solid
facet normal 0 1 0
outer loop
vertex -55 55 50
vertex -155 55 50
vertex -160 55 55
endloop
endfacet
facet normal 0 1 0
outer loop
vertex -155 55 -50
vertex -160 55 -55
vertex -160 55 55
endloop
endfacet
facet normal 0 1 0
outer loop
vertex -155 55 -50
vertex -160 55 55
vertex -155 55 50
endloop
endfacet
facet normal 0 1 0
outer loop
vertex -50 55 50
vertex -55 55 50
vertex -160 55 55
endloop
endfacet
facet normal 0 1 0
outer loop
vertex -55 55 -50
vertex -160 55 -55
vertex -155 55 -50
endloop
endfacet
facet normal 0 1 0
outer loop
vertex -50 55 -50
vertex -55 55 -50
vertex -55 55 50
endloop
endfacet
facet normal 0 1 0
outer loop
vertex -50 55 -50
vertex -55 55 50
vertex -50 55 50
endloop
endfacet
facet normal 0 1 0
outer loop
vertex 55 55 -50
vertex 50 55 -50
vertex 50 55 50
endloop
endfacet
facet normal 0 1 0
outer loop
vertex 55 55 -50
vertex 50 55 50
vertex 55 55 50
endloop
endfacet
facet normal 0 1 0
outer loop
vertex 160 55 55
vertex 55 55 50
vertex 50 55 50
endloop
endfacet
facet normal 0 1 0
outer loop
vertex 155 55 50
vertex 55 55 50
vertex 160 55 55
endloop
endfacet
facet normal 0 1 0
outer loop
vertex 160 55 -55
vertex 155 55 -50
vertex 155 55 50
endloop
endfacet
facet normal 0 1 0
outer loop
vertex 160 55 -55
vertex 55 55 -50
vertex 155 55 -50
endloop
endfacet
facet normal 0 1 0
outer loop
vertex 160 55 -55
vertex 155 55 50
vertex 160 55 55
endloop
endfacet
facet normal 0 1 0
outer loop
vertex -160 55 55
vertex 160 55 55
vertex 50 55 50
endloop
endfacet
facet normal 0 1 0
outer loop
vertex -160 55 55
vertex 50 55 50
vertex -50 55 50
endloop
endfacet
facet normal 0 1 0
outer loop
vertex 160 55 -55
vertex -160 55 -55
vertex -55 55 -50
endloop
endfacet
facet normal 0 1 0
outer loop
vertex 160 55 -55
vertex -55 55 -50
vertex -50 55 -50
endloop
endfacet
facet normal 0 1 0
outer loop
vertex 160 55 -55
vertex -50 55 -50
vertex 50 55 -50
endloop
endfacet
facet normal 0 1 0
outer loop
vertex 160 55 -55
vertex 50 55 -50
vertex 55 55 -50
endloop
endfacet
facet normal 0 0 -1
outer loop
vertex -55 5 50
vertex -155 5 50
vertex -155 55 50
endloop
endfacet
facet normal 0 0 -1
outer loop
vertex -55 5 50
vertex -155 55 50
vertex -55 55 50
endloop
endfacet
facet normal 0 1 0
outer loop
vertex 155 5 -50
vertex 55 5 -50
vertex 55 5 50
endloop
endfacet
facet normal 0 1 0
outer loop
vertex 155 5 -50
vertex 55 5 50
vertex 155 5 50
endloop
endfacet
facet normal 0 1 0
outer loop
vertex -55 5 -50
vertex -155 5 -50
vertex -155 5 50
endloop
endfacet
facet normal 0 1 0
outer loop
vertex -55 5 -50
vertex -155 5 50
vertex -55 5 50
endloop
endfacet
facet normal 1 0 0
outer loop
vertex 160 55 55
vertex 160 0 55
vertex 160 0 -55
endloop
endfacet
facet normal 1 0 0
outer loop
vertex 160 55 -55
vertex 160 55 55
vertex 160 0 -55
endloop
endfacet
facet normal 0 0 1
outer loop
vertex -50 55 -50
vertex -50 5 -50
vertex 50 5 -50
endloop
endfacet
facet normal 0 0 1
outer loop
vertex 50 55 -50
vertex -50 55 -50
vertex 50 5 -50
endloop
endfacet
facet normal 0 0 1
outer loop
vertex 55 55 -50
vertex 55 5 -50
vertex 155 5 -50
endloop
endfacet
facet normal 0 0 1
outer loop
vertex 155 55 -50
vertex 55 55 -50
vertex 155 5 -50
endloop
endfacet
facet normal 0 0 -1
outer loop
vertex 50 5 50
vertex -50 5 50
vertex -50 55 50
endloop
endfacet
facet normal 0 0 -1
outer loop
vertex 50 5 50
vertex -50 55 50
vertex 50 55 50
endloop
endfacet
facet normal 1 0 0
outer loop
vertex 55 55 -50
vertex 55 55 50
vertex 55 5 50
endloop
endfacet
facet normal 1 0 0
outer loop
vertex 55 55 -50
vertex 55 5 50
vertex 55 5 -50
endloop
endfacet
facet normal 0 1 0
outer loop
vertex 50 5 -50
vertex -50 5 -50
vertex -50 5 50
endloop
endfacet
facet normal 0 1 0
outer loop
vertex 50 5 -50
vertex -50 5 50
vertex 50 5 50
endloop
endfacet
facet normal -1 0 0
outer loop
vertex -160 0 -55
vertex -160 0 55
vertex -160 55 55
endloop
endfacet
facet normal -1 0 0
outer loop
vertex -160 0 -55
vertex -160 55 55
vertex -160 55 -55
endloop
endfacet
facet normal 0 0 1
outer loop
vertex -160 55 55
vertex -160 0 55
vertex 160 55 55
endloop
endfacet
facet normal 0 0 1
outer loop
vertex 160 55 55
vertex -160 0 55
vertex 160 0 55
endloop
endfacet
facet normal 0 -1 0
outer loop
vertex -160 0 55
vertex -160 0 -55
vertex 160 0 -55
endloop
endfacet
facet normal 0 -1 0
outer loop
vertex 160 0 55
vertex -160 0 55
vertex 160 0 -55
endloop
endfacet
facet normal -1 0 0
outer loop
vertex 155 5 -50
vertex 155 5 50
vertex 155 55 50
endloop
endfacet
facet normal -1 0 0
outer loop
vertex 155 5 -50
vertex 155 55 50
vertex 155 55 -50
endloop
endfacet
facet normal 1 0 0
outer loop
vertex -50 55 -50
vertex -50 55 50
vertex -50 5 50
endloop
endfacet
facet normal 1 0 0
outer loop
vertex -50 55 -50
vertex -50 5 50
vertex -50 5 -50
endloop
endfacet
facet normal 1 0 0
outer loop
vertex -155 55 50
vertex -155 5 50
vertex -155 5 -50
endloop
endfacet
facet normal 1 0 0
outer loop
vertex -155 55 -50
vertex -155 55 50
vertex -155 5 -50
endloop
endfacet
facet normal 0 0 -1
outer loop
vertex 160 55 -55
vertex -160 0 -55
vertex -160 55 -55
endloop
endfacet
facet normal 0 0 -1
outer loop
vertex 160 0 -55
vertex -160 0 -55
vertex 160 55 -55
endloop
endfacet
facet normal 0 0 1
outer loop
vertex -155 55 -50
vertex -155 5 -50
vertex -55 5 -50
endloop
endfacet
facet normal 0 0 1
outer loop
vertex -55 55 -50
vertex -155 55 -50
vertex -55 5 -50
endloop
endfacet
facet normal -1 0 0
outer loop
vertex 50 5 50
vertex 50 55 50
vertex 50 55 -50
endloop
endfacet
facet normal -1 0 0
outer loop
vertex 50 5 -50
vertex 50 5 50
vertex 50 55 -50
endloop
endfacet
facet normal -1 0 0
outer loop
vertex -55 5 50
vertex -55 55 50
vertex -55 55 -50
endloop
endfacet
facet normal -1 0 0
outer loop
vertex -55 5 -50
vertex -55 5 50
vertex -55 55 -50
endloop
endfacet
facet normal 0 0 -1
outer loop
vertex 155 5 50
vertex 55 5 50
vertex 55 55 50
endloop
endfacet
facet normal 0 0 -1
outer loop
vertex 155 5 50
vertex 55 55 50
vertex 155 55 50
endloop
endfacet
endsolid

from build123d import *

# Parameters (mm, degrees)
SKETCH_1_W       = 320
SKETCH_1_H       = 110
EXTRUDE_1_DEPTH  = 55
SHELL_1_T        = -5
RIB_1_REACH      = 179.904
SKETCH_2_WALLS_W = 5
SKETCH_2_WALLS_H = 457.808937494


with BuildPart() as part:
    # 草图1 → 凸台-拉伸1 (new body)
    with BuildSketch(Plane(origin=(0, 0, 0), x_dir=(1, 0, 0), z_dir=(0, 1, 0))):
        Rectangle(SKETCH_1_W, SKETCH_1_H)
    extrude(amount=EXTRUDE_1_DEPTH)

    # 抽壳1
    shell_1_openings = [part.faces().sort_by_distance(p)[0] for p in [
        (0, 55, 0),
    ]]
    offset(amount=SHELL_1_T, openings=shell_1_openings, kind=Kind.INTERSECTION)

    # 草图2 walls → 筋1 (add, up to next)
    with BuildSketch(Plane(origin=(0, 55, 0), x_dir=(1, 0, 0), z_dir=(0, 1, 0)), mode=Mode.PRIVATE) as rib_1_sk1:
        with Locations((52.5, 0)):
            Rectangle(SKETCH_2_WALLS_W, SKETCH_2_WALLS_H)
    rib_1_tool1 = extrude(rib_1_sk1.sketch, amount=-RIB_1_REACH, mode=Mode.PRIVATE) - part.part
    # 草图2 walls → 筋1 (add, up to next)
    with BuildSketch(Plane(origin=(0, 55, 0), x_dir=(1, 0, 0), z_dir=(0, 1, 0)), mode=Mode.PRIVATE) as rib_1_sk2:
        with Locations((-52.5, 0)):
            Rectangle(SKETCH_2_WALLS_W, SKETCH_2_WALLS_H)
    rib_1_tool2 = extrude(rib_1_sk2.sketch, amount=-RIB_1_REACH, mode=Mode.PRIVATE) - part.part
    add(rib_1_tool1.solids().sort_by_distance((52.5, 55, 0))[0])
    add(rib_1_tool2.solids().sort_by_distance((-52.5, 55, 0))[0])


solid = part.part
